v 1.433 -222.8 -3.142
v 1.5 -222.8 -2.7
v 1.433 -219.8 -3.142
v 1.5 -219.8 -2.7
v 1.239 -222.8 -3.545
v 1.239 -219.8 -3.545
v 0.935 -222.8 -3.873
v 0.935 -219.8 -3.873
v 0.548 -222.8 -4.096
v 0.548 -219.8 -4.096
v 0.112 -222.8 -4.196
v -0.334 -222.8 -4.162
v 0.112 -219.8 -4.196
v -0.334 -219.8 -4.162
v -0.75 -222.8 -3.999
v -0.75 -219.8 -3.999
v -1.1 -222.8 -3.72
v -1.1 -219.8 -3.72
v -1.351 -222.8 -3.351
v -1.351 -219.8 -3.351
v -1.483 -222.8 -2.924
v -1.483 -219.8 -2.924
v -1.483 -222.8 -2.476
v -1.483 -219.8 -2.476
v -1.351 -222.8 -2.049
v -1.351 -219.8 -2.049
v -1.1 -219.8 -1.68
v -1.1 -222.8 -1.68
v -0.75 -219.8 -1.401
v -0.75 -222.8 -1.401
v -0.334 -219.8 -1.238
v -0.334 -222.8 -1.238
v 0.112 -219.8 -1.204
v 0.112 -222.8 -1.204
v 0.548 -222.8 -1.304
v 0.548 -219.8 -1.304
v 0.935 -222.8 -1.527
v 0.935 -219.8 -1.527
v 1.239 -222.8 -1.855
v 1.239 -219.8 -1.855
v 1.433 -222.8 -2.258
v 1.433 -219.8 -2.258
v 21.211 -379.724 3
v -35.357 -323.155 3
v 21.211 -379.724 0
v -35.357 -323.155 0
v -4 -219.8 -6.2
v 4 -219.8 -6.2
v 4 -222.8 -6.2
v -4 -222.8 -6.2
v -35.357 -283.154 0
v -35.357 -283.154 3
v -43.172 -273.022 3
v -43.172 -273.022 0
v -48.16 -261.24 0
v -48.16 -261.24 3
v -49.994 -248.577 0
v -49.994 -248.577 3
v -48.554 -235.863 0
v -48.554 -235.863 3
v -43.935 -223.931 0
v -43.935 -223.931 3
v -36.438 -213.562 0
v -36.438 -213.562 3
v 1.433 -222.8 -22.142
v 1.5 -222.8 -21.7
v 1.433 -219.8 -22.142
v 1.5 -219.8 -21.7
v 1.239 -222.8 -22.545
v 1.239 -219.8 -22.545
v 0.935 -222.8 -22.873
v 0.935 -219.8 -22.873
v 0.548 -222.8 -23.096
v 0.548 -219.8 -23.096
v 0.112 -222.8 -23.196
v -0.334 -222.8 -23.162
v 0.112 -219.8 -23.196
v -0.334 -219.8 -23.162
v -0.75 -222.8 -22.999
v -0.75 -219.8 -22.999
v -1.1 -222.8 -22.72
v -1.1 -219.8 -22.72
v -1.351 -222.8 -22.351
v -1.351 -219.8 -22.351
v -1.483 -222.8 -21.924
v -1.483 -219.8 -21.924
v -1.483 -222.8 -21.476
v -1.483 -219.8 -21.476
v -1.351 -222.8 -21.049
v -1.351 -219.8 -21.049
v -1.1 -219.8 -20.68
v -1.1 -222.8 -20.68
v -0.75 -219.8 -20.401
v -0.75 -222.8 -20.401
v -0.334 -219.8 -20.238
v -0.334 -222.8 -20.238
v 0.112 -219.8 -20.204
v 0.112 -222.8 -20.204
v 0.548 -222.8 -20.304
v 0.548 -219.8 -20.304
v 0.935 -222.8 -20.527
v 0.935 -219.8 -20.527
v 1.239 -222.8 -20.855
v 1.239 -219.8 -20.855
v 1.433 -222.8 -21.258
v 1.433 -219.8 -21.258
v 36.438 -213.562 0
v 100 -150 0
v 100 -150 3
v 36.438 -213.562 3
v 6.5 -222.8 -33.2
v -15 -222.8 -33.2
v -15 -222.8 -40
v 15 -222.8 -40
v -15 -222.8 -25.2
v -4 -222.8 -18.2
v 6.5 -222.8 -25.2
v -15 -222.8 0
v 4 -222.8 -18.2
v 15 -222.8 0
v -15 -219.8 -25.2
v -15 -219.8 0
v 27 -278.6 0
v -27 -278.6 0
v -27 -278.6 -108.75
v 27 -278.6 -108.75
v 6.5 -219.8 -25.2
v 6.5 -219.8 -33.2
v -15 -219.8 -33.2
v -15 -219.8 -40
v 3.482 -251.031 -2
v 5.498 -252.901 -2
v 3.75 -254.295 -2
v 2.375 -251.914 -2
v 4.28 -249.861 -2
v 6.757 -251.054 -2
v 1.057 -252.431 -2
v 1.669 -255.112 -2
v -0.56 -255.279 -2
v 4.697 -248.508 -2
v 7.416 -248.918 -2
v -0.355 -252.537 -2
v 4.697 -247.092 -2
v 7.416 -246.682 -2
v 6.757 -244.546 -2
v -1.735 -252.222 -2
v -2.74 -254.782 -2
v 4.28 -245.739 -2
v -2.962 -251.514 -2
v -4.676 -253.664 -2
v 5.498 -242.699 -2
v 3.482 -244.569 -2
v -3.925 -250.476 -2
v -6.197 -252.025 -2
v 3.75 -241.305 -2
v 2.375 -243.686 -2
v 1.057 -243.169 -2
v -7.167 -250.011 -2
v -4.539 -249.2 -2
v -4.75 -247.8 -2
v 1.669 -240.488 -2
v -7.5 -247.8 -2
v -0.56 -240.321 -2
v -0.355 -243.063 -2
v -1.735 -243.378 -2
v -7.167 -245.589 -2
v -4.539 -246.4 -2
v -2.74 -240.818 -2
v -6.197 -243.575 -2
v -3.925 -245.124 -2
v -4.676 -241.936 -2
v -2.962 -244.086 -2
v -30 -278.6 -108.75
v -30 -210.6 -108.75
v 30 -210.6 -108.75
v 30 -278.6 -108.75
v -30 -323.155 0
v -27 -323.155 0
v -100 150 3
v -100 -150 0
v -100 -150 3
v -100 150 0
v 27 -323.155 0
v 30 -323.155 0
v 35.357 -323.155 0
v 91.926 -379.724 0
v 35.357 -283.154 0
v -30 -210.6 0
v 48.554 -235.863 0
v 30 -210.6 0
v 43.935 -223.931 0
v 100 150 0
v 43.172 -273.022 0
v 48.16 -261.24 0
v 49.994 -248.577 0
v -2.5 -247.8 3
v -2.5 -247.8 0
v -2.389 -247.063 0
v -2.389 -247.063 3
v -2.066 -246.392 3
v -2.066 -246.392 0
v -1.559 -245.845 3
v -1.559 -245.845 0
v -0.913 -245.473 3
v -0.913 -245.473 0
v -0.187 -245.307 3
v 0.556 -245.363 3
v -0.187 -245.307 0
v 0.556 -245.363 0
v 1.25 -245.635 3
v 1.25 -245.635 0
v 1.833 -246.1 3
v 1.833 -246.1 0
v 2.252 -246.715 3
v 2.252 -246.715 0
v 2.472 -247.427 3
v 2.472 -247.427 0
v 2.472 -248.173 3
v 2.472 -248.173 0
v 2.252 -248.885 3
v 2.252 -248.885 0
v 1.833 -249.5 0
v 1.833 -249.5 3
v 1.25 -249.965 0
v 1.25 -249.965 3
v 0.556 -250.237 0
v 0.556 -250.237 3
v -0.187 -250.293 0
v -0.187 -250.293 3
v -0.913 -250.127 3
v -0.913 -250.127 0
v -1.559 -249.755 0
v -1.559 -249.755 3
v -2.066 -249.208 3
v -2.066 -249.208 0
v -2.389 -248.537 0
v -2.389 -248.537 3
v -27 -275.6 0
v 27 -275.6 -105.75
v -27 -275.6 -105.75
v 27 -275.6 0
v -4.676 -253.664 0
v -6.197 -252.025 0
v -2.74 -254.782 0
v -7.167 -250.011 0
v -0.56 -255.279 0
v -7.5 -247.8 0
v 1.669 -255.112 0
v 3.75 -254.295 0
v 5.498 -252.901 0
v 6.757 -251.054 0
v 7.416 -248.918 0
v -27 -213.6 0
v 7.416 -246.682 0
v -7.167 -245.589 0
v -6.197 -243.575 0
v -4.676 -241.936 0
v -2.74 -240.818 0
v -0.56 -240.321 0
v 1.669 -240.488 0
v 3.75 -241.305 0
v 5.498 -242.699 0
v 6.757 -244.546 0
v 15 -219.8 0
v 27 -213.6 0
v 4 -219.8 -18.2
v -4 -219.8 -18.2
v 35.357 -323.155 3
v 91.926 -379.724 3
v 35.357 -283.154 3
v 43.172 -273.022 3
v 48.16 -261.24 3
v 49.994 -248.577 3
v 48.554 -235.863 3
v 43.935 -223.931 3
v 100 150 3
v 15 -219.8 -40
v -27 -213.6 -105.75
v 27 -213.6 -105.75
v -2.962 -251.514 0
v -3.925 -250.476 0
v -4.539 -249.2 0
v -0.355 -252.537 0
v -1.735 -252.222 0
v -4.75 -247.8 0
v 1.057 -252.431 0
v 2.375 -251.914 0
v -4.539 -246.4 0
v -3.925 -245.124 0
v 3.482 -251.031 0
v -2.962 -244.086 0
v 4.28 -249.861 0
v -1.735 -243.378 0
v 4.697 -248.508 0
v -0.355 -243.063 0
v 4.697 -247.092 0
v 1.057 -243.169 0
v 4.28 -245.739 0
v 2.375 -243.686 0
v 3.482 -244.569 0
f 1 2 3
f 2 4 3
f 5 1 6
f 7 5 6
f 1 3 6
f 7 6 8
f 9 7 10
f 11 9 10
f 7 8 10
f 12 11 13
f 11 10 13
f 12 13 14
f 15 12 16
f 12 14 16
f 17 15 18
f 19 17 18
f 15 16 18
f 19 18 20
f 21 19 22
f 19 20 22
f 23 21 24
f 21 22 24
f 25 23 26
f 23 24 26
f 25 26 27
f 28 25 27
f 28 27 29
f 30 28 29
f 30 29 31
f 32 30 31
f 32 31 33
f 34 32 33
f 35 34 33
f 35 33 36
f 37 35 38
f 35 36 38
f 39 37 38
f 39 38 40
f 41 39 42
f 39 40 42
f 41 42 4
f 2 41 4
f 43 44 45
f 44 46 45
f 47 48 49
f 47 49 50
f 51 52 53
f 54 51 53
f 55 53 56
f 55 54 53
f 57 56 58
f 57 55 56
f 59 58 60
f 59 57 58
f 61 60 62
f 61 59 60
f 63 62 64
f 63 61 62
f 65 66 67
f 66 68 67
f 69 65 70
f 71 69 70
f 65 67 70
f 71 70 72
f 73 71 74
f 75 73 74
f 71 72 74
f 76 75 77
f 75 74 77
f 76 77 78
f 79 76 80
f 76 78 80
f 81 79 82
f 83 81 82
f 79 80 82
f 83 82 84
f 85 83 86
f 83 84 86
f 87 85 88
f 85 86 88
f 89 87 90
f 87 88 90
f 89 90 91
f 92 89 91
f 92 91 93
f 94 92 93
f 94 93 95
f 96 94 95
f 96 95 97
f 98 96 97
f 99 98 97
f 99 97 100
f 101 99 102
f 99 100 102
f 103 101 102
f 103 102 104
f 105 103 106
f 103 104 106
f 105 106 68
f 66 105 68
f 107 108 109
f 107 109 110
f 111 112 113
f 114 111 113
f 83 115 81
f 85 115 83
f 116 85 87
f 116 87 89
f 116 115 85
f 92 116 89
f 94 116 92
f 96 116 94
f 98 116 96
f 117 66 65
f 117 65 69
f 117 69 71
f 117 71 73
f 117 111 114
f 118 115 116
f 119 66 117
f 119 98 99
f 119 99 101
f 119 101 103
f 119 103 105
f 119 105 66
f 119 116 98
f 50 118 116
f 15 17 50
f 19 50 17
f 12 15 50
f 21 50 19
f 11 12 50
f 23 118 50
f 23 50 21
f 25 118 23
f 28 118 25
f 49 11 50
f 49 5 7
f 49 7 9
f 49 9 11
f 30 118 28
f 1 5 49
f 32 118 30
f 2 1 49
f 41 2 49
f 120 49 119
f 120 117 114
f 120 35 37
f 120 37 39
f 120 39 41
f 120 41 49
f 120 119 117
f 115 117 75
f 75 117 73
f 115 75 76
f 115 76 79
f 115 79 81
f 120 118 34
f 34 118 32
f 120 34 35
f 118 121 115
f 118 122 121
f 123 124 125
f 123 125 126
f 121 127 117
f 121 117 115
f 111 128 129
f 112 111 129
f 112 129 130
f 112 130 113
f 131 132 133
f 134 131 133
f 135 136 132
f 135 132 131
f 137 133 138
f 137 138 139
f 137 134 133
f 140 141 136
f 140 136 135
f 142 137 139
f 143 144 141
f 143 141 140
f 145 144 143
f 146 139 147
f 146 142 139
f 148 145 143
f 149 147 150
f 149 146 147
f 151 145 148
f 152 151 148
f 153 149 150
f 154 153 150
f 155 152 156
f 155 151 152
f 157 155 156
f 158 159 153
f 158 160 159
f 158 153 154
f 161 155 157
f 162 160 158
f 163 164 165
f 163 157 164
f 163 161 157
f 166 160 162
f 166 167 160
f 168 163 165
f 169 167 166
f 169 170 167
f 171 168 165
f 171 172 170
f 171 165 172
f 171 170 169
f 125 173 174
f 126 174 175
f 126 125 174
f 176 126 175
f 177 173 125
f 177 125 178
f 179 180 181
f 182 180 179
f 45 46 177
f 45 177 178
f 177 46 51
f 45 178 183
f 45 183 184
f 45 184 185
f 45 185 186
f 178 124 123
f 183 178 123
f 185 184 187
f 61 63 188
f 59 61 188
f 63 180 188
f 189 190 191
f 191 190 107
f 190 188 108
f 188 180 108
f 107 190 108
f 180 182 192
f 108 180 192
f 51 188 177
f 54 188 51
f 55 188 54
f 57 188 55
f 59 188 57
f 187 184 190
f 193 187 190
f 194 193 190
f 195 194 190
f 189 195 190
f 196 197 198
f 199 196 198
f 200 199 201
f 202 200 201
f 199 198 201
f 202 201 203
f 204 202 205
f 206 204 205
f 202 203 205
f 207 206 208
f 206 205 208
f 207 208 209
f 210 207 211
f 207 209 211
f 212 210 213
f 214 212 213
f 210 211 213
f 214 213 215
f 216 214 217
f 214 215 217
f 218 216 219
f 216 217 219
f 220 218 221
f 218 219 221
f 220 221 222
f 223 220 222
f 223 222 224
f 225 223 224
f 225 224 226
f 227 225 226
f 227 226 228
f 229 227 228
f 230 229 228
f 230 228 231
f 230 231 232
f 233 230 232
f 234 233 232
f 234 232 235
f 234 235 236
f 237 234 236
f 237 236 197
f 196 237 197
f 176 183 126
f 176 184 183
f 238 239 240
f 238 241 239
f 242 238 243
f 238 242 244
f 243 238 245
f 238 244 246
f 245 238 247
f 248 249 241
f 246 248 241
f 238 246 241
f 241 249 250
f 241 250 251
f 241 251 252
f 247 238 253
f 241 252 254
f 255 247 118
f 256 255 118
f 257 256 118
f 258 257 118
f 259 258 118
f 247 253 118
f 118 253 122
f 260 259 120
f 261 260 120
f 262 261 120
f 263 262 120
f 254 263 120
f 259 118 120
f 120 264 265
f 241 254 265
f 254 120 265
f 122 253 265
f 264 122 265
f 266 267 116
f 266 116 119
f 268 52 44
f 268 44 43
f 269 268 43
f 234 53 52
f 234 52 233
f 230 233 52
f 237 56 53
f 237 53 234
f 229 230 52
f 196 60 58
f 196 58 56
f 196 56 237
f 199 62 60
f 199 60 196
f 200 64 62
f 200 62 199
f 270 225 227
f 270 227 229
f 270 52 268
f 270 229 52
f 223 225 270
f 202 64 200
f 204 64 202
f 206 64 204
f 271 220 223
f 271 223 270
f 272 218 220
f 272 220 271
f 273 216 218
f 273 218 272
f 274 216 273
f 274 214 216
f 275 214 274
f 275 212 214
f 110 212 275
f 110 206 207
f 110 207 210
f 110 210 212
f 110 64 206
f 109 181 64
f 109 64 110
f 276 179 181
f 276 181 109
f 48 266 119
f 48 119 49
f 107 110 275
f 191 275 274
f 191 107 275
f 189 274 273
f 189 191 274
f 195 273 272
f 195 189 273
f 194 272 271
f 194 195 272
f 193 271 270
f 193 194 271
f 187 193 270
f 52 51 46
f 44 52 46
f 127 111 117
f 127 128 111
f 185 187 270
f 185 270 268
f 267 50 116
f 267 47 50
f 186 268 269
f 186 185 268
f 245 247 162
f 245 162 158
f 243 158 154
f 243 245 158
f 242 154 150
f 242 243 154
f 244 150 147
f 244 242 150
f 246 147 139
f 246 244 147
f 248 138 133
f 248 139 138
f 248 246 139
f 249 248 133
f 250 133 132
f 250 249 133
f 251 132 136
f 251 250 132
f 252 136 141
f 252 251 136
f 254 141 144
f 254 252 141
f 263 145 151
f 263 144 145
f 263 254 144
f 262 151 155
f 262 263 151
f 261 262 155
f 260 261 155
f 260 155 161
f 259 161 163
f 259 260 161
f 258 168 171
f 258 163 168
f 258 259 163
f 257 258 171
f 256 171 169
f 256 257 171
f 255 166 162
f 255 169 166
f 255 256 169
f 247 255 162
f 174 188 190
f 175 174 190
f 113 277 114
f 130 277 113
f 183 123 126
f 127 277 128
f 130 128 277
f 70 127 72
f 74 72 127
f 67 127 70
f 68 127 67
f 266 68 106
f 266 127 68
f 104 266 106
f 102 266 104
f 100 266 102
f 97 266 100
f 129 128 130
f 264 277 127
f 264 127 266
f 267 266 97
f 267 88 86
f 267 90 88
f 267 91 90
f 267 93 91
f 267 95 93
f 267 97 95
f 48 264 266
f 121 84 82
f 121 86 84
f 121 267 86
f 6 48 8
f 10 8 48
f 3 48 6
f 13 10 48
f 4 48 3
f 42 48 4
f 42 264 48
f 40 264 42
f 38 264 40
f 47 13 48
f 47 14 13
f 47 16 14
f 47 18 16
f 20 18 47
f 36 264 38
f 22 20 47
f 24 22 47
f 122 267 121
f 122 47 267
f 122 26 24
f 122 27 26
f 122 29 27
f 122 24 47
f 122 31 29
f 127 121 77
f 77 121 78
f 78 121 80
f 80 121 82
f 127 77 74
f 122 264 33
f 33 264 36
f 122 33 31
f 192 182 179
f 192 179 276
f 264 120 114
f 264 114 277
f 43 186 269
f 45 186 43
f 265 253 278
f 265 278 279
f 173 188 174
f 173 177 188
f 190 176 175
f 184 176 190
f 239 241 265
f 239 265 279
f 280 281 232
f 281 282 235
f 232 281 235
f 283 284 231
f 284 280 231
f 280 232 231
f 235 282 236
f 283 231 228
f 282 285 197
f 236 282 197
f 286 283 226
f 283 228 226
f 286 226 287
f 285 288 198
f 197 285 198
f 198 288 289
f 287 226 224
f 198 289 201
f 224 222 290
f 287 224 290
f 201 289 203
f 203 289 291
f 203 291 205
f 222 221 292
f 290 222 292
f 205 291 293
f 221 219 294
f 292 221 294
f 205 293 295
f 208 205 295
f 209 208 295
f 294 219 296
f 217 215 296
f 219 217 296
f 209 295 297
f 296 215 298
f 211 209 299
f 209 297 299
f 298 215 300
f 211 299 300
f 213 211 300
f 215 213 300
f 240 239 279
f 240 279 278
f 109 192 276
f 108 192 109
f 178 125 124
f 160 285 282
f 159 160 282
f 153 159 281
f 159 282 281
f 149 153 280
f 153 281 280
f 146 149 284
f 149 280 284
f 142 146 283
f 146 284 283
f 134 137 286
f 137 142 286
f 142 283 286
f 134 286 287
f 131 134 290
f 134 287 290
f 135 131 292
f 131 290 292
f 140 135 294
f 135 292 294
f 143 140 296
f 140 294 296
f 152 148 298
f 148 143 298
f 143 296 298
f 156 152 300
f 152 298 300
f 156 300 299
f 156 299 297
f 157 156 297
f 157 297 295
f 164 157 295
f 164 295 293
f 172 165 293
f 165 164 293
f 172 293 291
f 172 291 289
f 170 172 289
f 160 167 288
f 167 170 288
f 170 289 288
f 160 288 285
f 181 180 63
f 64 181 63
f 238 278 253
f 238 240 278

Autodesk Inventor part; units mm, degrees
sketch "Sketch1" plane through (0, 0, 0) normal (0, 0, 1) x (1, 0, 0)
  line L0 (-100, 150) -> (100, 150)
  line L1 (100, 150) -> (100, -150)
  line L2 (-100, -150) -> (-100, 150)
  line L3 (-100, 150) -> (100, -150) construction
  line L4 (100, 150) -> (-100, -150) construction
  line L5 (100, -150) -> (36.4382, -213.5618)
  line L6 (-35.3571, -283.1536) -> (-35.3571, -323.1554)
  line L7 (-35.3571, -323.1554) -> (21.2114, -379.7239)
  line L8 (35.3571, -283.1536) -> (35.3571, -323.1554)
  line L9 (35.3571, -323.1554) -> (91.9257, -379.7239)
  line L10 (91.9257, -379.7239) -> (21.2114, -379.7239)
  arc A0 (-35.3571, -283.1536) -> (-35.3553, -283.1554) centre (0, -247.8) ccw
  arc A1 (-36.4382, -213.5618) -> (-35.3553, -283.1554) centre (0, -247.8) ccw
  arc A2 (35.3571, -283.1536) -> (36.4382, -213.5618) centre (0, -247.8) ccw
  line L11 (-100, -150) -> (-36.4382, -213.5618)
  point P0 (0, 0)
  point P1 (35.3571, -285.3571)
extrude "Extrusion1" add sketch "Sketch1" along normal blind 3
sketch "Sketch3" plane through (0, 0, 0) normal (0, 0, -1) x (-1, 0, 0)
  arc A0 (-36.4382, -213.5618) -> (-35.3571, -283.1536) centre (0, -247.8) ccw projected
  circle A1 centre (0, -247.8) radius 2.5
  circle A2 centre (0, -247.8) radius 4.75
  circle A3 centre (0, -247.8) radius 7.5
  point P0 (0, 0)
  dimension "d27" = 5
  dimension "d28" = 9.5
  dimension "d29" = 15
extrude "Extrusion4" cut sketch "Sketch3" against normal blind 3 contours A1
extrude "Extrusion5" add sketch "Sketch3" along normal blind 2 contours A3
sketch "Sketch4" plane through (0, 0, 0) normal (0, 0, -1) x (-1, 0, 0)
  line L0 (-30, -275.6) -> (30, -275.6)
  line L1 (30, -275.6) -> (30, -278.6)
  line L2 (30, -278.6) -> (-30, -278.6)
  line L3 (-30, -278.6) -> (-30, -275.6)
  line L4 (-30, -275.6) -> (30, -278.6) construction
  line L5 (30, -275.6) -> (-30, -278.6) construction
  circle A0 centre (0, -247.8) radius 2.5 projected
  point P0 (0, 0)
  point P1 (0, -277.1)
  dimension "d34" = 60
  dimension "d35" = 3
  dimension "d36" = 27.8
extrude "Extrusion6" add sketch "Sketch4" along normal blind 108.75 contours L0 L1 L2 L3
ref_plane "Work Plane1" through (30, -275.6, -108.75) normal (1, 0, 0) x (0, 0, -1)
sketch "Sketch5" plane through (30, -275.6, -108.75) normal (1, 0, 0) x (0, 0, -1)
  line L0 (-108.75, 62.0382) -> (-108.75, -7.5536) projected
  line L1 (0, 0) -> (141.4214, 0) construction
  line L2 (-108.75, -47.5554) -> (-111.75, -47.5554) projected
  line L3 (-108.75, -3) -> (0, -3) projected
  line L4 (-108.75, -47.5554) -> (0, -3)
  line L5 (0, -3) -> (-108.75, -3)
  line L6 (-108.75, -3) -> (-108.75, -47.5554)
  point P0 (-108.75, 275.6)
  point P1 (-108.75, 0)
  point P2 (-108.75, 100)
ref_plane "Work Plane2" through (0, -278.6, 0) normal (1, 0, 0) x (0, 0, -1)
extrude "Extrusion8" add sketch "Sketch5" against normal blind 3
ref_plane "Work Plane3" through (0, -275.6, 0) normal (1, 0, 0) x (0, 0, -1)
mirror "Mirror2" about plane through (0, -275.6, 0) normal (1, 0, 0) of "Extrusion8"
sketch "Sketch6" plane through (0, 0, 0) normal (0, 0, -1) x (-1, 0, 0)
  line L0 (-15, -219.8) -> (15, -219.8)
  line L1 (15, -219.8) -> (15, -222.8)
  line L2 (15, -222.8) -> (-15, -222.8)
  line L3 (-15, -222.8) -> (-15, -219.8)
  line L4 (-15, -219.8) -> (15, -222.8) construction
  line L5 (15, -219.8) -> (-15, -222.8) construction
  circle A0 centre (0, -247.8) radius 2.5 projected
  point P0 (0, 0)
  point P1 (0, -221.3)
  dimension "d46" = 30
  dimension "d47" = 3
  dimension "d48" = 25
extrude "Extrusion9" add sketch "Sketch6" along normal blind 40 contours L0 L1 L2 L3
sketch "Sketch7" plane through (-15, -219.8, 0) normal (0, 1, 0) x (1, 0, 0)
  circle A0 centre (15, 2.7) radius 1.5
  line L0 (115, 0) -> (-85, 0) projected
  line L1 (19, 6.2) -> (11, 6.2)
  line L2 (11, 6.2) -> (11, 18.2)
  line L3 (11, 18.2) -> (19, 18.2)
  line L4 (19, 18.2) -> (19, 6.2)
  line L5 (19, 6.2) -> (11, 18.2) construction
  line L6 (11, 6.2) -> (19, 18.2) construction
  circle A1 centre (15, 21.7) radius 1.5
  line L7 (21.5, 25.2) -> (0, 25.2)
  line L8 (1, 33.2) -> (21.5, 33.2)
  line L9 (21.5, 33.2) -> (21.5, 25.2)
  line L10 (21.5, 25.2) -> (8.5, 33.2) construction
  line L11 (8.5, 25.2) -> (21.5, 33.2) construction
  line L12 (1, 33.2) -> (0, 33.2)
  line L13 (0, 0) -> (0, 40) projected
  point P0 (15, 0)
  point P1 (15, 12.2)
  point P2 (15, 29.2)
  dimension "d51" = 3
  dimension "d52" = 2.7
  dimension "d53" = 8
  dimension "d54" = 12
  dimension "d55" = 3.5
  dimension "d56" = 3
  dimension "d57" = 3.5
  dimension "d60" = 3.5
extrude "Extrusion10" cut sketch "Sketch7" against normal mid plane 10
sketch "Sketch8" plane through (-30, -275.6, 0) normal (0, 1, 0) x (1, 0, 0)
  line L0 (0, 0) -> (0, 108.75)
  line L1 (0, 108.75) -> (60, 108.75)
  line L2 (60, 108.75) -> (60, 0)
  line L3 (60, 0) -> (0, 108.75) construction
  line L4 (0, 0) -> (60, 108.75) construction
  line L5 (57, 105.75) -> (3, 105.75)
  line L6 (3, 105.75) -> (3, 0)
  line L7 (57, 0) -> (57, 105.75)
  line L8 (60, 0) -> (57, 0)
  line L9 (3, 0) -> (0, 0)
  point P0 (30, 0)
  point P1 (30, 54.375)
extrude "Extrusion11" add sketch "Sketch8" along normal blind 62
sketch "Sketch9" plane through (-30, -213.6, 0) normal (0, 1, 0) x (1, 0, 0)
  line L0 (0, 0) -> (0, 108.75) projected
  line L1 (60, 0) -> (0, 0)
  line L2 (0, 0) -> (0, 108.75)
  line L3 (0, 108.75) -> (60, 108.75)
  line L4 (60, 108.75) -> (60, 0)
  point P0 (30, 0)
extrude "Extrusion12" add sketch "Sketch9" along normal blind 3
properties part number "rightside0"
